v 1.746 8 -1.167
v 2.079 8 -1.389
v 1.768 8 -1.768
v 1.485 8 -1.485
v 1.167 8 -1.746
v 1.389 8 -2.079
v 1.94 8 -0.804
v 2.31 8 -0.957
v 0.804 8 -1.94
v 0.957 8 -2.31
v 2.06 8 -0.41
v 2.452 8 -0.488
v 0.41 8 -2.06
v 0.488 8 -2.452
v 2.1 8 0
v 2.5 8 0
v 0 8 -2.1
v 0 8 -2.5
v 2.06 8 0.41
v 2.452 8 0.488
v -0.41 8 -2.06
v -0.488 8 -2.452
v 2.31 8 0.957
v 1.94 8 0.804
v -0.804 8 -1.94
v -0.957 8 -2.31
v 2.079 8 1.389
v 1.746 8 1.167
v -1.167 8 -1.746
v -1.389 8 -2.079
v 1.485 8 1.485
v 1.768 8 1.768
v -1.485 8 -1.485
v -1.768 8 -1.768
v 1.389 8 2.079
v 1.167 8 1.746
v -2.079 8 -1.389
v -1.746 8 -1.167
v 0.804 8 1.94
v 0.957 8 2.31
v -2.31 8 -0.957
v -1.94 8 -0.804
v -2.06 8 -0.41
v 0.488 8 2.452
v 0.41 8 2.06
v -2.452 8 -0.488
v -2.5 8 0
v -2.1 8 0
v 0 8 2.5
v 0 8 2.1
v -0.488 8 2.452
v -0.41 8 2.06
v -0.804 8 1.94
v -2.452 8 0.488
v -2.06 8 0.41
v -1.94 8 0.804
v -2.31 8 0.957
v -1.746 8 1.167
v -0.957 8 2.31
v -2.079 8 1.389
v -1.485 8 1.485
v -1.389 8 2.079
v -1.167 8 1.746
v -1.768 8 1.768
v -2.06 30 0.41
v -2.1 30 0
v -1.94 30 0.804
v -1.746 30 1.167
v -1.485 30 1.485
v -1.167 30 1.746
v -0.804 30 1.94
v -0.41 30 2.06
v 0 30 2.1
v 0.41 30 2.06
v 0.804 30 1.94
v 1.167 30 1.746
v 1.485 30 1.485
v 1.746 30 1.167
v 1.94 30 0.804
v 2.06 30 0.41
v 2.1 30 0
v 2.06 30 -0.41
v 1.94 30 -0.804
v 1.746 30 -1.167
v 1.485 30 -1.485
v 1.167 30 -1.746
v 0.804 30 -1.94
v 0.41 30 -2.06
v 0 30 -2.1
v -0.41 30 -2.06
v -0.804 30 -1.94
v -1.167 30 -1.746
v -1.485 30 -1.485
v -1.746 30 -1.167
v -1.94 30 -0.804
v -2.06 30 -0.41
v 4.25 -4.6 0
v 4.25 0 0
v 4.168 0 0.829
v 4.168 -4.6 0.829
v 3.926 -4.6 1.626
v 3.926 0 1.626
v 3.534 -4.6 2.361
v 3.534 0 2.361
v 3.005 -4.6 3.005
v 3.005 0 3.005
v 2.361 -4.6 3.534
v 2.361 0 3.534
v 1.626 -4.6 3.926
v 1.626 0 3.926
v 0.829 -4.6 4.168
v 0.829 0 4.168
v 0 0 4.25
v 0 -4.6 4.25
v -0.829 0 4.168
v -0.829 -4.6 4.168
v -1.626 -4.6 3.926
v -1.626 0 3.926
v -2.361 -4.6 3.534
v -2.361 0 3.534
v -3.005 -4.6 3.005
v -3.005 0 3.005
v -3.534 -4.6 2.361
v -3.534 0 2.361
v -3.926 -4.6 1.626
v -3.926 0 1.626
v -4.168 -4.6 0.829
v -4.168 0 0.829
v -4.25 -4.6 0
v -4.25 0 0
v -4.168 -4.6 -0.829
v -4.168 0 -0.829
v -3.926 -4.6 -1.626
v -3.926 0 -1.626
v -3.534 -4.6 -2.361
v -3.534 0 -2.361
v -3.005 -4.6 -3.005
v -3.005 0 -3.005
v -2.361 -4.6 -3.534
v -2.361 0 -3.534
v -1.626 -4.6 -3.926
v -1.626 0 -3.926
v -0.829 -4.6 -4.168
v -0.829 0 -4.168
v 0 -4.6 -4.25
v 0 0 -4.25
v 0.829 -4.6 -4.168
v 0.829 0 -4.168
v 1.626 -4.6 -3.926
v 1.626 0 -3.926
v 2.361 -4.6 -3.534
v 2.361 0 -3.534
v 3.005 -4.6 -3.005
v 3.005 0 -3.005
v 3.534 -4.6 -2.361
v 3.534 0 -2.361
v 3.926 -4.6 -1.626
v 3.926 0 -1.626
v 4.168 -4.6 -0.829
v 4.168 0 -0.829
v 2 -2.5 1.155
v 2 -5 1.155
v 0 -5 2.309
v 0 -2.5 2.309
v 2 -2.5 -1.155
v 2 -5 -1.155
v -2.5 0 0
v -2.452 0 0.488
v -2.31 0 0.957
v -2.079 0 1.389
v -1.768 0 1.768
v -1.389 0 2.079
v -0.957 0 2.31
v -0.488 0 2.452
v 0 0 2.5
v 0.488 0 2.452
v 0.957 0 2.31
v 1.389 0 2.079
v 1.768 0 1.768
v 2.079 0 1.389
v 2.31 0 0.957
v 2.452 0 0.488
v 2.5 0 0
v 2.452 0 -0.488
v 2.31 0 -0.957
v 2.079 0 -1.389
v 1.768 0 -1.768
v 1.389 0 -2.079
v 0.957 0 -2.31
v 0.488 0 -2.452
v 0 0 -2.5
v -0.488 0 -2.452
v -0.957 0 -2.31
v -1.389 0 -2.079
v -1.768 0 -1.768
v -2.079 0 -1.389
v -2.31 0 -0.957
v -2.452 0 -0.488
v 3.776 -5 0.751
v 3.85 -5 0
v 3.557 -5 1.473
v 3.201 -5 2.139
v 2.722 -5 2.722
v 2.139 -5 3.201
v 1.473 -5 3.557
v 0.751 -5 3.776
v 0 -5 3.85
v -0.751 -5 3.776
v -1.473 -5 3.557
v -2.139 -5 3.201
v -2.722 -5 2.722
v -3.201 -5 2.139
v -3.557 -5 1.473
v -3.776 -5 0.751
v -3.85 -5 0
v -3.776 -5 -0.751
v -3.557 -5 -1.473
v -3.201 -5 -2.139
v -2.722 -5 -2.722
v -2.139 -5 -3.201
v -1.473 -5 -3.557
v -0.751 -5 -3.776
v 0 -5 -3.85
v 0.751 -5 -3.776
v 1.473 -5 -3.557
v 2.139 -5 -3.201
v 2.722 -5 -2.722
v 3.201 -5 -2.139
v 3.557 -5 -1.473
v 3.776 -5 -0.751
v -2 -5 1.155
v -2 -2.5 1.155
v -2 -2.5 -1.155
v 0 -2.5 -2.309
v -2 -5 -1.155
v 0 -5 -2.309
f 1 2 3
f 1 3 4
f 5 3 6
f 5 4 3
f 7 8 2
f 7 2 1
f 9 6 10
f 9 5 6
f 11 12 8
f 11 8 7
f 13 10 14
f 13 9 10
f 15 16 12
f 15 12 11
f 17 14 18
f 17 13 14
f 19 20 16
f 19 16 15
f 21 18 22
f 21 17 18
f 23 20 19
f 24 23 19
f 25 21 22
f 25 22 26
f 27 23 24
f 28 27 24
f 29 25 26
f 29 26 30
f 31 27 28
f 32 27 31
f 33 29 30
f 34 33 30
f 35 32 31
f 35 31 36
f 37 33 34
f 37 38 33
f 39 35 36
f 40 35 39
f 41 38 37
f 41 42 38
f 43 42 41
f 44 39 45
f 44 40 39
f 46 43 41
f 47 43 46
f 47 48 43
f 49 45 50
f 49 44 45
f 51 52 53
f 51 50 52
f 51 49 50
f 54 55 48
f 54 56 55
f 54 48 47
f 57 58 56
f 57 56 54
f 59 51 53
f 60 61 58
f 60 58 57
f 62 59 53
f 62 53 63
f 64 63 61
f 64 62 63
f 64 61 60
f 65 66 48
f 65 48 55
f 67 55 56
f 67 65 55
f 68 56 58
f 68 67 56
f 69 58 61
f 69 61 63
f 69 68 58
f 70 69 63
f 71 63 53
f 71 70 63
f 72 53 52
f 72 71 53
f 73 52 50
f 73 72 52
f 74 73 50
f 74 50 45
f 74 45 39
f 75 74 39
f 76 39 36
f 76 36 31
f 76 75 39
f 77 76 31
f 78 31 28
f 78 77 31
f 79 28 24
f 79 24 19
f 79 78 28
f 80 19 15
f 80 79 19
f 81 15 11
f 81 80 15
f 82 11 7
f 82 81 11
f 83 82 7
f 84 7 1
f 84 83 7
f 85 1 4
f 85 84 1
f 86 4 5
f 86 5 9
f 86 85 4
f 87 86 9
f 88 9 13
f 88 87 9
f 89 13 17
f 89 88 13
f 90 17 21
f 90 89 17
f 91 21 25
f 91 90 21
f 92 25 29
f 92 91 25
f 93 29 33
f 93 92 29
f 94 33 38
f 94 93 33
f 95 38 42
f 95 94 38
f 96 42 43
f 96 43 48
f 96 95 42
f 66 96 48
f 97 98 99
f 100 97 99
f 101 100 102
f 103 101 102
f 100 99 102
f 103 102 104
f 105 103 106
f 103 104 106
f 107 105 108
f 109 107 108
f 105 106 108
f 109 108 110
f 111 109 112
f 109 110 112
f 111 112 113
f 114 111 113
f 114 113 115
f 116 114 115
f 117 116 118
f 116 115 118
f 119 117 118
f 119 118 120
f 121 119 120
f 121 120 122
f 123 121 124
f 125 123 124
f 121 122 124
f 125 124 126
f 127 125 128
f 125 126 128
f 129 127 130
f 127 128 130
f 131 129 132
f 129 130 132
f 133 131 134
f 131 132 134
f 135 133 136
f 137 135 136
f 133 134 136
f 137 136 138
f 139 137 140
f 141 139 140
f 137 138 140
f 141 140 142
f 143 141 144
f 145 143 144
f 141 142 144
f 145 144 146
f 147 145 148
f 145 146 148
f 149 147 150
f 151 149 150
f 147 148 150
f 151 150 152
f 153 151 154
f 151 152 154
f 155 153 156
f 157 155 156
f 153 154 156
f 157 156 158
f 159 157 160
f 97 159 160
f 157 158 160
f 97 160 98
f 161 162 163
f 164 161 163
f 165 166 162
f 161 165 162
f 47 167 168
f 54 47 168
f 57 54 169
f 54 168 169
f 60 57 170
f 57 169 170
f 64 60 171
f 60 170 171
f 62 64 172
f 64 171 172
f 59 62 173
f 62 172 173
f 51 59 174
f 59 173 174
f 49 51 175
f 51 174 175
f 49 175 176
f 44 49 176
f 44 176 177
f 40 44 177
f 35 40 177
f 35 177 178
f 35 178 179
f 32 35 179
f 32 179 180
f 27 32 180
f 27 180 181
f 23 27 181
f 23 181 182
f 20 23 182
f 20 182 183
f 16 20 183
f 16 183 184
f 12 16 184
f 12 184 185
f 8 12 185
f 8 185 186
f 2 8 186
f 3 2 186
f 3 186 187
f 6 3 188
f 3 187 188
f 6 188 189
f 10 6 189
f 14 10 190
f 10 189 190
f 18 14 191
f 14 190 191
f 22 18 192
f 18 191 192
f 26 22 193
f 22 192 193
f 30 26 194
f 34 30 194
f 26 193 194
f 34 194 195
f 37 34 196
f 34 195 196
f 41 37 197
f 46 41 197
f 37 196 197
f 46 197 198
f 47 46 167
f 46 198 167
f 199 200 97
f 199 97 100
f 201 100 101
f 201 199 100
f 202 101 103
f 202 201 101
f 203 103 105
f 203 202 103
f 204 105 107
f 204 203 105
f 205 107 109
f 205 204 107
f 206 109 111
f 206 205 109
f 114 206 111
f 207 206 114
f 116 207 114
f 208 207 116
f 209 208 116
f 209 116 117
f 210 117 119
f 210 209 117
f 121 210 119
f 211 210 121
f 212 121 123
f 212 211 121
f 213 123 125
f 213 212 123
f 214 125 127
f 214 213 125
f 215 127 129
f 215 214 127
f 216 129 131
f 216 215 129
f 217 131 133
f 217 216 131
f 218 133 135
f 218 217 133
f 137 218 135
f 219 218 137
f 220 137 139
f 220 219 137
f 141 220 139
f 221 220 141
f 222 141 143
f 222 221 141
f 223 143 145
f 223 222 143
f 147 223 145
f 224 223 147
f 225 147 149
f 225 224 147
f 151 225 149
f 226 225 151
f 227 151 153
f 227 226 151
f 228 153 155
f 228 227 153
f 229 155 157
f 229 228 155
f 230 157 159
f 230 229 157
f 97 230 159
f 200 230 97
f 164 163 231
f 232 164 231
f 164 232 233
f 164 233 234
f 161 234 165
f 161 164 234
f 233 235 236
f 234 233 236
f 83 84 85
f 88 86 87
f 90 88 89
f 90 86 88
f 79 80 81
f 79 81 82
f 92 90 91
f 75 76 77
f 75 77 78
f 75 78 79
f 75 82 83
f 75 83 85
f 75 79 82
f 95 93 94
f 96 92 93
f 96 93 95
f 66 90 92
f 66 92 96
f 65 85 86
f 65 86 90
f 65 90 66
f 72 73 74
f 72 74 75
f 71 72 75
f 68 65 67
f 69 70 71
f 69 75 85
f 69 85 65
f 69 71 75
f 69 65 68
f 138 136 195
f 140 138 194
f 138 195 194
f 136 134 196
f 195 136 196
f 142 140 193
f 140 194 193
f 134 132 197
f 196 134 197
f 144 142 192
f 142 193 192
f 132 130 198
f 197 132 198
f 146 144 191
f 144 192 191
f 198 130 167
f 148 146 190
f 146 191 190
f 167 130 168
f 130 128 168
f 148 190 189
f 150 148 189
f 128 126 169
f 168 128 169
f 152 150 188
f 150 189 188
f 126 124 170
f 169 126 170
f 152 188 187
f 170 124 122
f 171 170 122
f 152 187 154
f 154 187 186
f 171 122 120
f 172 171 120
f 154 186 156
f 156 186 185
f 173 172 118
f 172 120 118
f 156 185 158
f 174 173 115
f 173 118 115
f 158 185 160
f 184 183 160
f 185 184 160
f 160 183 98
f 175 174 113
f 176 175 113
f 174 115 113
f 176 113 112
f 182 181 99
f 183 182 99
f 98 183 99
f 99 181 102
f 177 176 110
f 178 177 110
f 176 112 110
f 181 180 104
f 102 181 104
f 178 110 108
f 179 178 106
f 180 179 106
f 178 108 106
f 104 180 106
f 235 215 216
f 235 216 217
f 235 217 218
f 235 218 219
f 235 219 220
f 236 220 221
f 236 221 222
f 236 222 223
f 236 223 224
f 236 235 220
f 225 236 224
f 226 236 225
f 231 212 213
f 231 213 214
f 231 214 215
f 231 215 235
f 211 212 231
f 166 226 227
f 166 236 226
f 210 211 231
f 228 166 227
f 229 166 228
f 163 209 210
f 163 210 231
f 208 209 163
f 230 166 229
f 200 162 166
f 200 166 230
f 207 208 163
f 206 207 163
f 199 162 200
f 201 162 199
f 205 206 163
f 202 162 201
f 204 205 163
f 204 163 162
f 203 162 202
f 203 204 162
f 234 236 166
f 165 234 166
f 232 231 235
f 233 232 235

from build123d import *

# Parameters (mm, degrees)
F0_R     = 4.25
F1_DEPTH = 5
F2_R     = 2.5
F3_DEPTH = 30
F4_R     = 2.5
F4_R_2   = 2.1
F5_DEPTH = 22
F7_DEPTH = 2.5
F8_SIZE  = 0.4


with BuildPart() as f1:
    # F0 (on Front) → F1 (new body)
    with BuildSketch(Plane.XZ):
        Circle(F0_R)
    extrude(amount=F1_DEPTH)

    # F2 (on face) → F3 (join)
    with BuildSketch(Plane(origin=(0, 0, 0), x_dir=(-1, 0, 0), z_dir=(0, 1, 0))):
        Circle(F2_R)
    extrude(amount=F3_DEPTH)

    # F4 (on face) → F5 (cut)
    with BuildSketch(Plane(origin=(0, 30, 0), x_dir=(-1, 0, 0), z_dir=(0, 1, 0))):
        Circle(F4_R)
        Circle(F4_R_2, mode=Mode.SUBTRACT)
    extrude(amount=-F5_DEPTH, mode=Mode.SUBTRACT)

    # F6 (on face) → F7 (cut)
    with BuildSketch(Plane.XZ.offset(5)):
        Polygon((0, -2.309401), (2, -1.154701), (2, 1.154701), (0, 2.309401), (-2, 1.154701), (-2, -1.154701), align=None)
    extrude(amount=-F7_DEPTH, mode=Mode.SUBTRACT)

    # F8
    f8_edges = [f1.edges().sort_by_distance(p)[0] for p in [
        (-4.25, -5, 0),
    ]]
    chamfer(f8_edges, length=F8_SIZE)


solid = f1.part
